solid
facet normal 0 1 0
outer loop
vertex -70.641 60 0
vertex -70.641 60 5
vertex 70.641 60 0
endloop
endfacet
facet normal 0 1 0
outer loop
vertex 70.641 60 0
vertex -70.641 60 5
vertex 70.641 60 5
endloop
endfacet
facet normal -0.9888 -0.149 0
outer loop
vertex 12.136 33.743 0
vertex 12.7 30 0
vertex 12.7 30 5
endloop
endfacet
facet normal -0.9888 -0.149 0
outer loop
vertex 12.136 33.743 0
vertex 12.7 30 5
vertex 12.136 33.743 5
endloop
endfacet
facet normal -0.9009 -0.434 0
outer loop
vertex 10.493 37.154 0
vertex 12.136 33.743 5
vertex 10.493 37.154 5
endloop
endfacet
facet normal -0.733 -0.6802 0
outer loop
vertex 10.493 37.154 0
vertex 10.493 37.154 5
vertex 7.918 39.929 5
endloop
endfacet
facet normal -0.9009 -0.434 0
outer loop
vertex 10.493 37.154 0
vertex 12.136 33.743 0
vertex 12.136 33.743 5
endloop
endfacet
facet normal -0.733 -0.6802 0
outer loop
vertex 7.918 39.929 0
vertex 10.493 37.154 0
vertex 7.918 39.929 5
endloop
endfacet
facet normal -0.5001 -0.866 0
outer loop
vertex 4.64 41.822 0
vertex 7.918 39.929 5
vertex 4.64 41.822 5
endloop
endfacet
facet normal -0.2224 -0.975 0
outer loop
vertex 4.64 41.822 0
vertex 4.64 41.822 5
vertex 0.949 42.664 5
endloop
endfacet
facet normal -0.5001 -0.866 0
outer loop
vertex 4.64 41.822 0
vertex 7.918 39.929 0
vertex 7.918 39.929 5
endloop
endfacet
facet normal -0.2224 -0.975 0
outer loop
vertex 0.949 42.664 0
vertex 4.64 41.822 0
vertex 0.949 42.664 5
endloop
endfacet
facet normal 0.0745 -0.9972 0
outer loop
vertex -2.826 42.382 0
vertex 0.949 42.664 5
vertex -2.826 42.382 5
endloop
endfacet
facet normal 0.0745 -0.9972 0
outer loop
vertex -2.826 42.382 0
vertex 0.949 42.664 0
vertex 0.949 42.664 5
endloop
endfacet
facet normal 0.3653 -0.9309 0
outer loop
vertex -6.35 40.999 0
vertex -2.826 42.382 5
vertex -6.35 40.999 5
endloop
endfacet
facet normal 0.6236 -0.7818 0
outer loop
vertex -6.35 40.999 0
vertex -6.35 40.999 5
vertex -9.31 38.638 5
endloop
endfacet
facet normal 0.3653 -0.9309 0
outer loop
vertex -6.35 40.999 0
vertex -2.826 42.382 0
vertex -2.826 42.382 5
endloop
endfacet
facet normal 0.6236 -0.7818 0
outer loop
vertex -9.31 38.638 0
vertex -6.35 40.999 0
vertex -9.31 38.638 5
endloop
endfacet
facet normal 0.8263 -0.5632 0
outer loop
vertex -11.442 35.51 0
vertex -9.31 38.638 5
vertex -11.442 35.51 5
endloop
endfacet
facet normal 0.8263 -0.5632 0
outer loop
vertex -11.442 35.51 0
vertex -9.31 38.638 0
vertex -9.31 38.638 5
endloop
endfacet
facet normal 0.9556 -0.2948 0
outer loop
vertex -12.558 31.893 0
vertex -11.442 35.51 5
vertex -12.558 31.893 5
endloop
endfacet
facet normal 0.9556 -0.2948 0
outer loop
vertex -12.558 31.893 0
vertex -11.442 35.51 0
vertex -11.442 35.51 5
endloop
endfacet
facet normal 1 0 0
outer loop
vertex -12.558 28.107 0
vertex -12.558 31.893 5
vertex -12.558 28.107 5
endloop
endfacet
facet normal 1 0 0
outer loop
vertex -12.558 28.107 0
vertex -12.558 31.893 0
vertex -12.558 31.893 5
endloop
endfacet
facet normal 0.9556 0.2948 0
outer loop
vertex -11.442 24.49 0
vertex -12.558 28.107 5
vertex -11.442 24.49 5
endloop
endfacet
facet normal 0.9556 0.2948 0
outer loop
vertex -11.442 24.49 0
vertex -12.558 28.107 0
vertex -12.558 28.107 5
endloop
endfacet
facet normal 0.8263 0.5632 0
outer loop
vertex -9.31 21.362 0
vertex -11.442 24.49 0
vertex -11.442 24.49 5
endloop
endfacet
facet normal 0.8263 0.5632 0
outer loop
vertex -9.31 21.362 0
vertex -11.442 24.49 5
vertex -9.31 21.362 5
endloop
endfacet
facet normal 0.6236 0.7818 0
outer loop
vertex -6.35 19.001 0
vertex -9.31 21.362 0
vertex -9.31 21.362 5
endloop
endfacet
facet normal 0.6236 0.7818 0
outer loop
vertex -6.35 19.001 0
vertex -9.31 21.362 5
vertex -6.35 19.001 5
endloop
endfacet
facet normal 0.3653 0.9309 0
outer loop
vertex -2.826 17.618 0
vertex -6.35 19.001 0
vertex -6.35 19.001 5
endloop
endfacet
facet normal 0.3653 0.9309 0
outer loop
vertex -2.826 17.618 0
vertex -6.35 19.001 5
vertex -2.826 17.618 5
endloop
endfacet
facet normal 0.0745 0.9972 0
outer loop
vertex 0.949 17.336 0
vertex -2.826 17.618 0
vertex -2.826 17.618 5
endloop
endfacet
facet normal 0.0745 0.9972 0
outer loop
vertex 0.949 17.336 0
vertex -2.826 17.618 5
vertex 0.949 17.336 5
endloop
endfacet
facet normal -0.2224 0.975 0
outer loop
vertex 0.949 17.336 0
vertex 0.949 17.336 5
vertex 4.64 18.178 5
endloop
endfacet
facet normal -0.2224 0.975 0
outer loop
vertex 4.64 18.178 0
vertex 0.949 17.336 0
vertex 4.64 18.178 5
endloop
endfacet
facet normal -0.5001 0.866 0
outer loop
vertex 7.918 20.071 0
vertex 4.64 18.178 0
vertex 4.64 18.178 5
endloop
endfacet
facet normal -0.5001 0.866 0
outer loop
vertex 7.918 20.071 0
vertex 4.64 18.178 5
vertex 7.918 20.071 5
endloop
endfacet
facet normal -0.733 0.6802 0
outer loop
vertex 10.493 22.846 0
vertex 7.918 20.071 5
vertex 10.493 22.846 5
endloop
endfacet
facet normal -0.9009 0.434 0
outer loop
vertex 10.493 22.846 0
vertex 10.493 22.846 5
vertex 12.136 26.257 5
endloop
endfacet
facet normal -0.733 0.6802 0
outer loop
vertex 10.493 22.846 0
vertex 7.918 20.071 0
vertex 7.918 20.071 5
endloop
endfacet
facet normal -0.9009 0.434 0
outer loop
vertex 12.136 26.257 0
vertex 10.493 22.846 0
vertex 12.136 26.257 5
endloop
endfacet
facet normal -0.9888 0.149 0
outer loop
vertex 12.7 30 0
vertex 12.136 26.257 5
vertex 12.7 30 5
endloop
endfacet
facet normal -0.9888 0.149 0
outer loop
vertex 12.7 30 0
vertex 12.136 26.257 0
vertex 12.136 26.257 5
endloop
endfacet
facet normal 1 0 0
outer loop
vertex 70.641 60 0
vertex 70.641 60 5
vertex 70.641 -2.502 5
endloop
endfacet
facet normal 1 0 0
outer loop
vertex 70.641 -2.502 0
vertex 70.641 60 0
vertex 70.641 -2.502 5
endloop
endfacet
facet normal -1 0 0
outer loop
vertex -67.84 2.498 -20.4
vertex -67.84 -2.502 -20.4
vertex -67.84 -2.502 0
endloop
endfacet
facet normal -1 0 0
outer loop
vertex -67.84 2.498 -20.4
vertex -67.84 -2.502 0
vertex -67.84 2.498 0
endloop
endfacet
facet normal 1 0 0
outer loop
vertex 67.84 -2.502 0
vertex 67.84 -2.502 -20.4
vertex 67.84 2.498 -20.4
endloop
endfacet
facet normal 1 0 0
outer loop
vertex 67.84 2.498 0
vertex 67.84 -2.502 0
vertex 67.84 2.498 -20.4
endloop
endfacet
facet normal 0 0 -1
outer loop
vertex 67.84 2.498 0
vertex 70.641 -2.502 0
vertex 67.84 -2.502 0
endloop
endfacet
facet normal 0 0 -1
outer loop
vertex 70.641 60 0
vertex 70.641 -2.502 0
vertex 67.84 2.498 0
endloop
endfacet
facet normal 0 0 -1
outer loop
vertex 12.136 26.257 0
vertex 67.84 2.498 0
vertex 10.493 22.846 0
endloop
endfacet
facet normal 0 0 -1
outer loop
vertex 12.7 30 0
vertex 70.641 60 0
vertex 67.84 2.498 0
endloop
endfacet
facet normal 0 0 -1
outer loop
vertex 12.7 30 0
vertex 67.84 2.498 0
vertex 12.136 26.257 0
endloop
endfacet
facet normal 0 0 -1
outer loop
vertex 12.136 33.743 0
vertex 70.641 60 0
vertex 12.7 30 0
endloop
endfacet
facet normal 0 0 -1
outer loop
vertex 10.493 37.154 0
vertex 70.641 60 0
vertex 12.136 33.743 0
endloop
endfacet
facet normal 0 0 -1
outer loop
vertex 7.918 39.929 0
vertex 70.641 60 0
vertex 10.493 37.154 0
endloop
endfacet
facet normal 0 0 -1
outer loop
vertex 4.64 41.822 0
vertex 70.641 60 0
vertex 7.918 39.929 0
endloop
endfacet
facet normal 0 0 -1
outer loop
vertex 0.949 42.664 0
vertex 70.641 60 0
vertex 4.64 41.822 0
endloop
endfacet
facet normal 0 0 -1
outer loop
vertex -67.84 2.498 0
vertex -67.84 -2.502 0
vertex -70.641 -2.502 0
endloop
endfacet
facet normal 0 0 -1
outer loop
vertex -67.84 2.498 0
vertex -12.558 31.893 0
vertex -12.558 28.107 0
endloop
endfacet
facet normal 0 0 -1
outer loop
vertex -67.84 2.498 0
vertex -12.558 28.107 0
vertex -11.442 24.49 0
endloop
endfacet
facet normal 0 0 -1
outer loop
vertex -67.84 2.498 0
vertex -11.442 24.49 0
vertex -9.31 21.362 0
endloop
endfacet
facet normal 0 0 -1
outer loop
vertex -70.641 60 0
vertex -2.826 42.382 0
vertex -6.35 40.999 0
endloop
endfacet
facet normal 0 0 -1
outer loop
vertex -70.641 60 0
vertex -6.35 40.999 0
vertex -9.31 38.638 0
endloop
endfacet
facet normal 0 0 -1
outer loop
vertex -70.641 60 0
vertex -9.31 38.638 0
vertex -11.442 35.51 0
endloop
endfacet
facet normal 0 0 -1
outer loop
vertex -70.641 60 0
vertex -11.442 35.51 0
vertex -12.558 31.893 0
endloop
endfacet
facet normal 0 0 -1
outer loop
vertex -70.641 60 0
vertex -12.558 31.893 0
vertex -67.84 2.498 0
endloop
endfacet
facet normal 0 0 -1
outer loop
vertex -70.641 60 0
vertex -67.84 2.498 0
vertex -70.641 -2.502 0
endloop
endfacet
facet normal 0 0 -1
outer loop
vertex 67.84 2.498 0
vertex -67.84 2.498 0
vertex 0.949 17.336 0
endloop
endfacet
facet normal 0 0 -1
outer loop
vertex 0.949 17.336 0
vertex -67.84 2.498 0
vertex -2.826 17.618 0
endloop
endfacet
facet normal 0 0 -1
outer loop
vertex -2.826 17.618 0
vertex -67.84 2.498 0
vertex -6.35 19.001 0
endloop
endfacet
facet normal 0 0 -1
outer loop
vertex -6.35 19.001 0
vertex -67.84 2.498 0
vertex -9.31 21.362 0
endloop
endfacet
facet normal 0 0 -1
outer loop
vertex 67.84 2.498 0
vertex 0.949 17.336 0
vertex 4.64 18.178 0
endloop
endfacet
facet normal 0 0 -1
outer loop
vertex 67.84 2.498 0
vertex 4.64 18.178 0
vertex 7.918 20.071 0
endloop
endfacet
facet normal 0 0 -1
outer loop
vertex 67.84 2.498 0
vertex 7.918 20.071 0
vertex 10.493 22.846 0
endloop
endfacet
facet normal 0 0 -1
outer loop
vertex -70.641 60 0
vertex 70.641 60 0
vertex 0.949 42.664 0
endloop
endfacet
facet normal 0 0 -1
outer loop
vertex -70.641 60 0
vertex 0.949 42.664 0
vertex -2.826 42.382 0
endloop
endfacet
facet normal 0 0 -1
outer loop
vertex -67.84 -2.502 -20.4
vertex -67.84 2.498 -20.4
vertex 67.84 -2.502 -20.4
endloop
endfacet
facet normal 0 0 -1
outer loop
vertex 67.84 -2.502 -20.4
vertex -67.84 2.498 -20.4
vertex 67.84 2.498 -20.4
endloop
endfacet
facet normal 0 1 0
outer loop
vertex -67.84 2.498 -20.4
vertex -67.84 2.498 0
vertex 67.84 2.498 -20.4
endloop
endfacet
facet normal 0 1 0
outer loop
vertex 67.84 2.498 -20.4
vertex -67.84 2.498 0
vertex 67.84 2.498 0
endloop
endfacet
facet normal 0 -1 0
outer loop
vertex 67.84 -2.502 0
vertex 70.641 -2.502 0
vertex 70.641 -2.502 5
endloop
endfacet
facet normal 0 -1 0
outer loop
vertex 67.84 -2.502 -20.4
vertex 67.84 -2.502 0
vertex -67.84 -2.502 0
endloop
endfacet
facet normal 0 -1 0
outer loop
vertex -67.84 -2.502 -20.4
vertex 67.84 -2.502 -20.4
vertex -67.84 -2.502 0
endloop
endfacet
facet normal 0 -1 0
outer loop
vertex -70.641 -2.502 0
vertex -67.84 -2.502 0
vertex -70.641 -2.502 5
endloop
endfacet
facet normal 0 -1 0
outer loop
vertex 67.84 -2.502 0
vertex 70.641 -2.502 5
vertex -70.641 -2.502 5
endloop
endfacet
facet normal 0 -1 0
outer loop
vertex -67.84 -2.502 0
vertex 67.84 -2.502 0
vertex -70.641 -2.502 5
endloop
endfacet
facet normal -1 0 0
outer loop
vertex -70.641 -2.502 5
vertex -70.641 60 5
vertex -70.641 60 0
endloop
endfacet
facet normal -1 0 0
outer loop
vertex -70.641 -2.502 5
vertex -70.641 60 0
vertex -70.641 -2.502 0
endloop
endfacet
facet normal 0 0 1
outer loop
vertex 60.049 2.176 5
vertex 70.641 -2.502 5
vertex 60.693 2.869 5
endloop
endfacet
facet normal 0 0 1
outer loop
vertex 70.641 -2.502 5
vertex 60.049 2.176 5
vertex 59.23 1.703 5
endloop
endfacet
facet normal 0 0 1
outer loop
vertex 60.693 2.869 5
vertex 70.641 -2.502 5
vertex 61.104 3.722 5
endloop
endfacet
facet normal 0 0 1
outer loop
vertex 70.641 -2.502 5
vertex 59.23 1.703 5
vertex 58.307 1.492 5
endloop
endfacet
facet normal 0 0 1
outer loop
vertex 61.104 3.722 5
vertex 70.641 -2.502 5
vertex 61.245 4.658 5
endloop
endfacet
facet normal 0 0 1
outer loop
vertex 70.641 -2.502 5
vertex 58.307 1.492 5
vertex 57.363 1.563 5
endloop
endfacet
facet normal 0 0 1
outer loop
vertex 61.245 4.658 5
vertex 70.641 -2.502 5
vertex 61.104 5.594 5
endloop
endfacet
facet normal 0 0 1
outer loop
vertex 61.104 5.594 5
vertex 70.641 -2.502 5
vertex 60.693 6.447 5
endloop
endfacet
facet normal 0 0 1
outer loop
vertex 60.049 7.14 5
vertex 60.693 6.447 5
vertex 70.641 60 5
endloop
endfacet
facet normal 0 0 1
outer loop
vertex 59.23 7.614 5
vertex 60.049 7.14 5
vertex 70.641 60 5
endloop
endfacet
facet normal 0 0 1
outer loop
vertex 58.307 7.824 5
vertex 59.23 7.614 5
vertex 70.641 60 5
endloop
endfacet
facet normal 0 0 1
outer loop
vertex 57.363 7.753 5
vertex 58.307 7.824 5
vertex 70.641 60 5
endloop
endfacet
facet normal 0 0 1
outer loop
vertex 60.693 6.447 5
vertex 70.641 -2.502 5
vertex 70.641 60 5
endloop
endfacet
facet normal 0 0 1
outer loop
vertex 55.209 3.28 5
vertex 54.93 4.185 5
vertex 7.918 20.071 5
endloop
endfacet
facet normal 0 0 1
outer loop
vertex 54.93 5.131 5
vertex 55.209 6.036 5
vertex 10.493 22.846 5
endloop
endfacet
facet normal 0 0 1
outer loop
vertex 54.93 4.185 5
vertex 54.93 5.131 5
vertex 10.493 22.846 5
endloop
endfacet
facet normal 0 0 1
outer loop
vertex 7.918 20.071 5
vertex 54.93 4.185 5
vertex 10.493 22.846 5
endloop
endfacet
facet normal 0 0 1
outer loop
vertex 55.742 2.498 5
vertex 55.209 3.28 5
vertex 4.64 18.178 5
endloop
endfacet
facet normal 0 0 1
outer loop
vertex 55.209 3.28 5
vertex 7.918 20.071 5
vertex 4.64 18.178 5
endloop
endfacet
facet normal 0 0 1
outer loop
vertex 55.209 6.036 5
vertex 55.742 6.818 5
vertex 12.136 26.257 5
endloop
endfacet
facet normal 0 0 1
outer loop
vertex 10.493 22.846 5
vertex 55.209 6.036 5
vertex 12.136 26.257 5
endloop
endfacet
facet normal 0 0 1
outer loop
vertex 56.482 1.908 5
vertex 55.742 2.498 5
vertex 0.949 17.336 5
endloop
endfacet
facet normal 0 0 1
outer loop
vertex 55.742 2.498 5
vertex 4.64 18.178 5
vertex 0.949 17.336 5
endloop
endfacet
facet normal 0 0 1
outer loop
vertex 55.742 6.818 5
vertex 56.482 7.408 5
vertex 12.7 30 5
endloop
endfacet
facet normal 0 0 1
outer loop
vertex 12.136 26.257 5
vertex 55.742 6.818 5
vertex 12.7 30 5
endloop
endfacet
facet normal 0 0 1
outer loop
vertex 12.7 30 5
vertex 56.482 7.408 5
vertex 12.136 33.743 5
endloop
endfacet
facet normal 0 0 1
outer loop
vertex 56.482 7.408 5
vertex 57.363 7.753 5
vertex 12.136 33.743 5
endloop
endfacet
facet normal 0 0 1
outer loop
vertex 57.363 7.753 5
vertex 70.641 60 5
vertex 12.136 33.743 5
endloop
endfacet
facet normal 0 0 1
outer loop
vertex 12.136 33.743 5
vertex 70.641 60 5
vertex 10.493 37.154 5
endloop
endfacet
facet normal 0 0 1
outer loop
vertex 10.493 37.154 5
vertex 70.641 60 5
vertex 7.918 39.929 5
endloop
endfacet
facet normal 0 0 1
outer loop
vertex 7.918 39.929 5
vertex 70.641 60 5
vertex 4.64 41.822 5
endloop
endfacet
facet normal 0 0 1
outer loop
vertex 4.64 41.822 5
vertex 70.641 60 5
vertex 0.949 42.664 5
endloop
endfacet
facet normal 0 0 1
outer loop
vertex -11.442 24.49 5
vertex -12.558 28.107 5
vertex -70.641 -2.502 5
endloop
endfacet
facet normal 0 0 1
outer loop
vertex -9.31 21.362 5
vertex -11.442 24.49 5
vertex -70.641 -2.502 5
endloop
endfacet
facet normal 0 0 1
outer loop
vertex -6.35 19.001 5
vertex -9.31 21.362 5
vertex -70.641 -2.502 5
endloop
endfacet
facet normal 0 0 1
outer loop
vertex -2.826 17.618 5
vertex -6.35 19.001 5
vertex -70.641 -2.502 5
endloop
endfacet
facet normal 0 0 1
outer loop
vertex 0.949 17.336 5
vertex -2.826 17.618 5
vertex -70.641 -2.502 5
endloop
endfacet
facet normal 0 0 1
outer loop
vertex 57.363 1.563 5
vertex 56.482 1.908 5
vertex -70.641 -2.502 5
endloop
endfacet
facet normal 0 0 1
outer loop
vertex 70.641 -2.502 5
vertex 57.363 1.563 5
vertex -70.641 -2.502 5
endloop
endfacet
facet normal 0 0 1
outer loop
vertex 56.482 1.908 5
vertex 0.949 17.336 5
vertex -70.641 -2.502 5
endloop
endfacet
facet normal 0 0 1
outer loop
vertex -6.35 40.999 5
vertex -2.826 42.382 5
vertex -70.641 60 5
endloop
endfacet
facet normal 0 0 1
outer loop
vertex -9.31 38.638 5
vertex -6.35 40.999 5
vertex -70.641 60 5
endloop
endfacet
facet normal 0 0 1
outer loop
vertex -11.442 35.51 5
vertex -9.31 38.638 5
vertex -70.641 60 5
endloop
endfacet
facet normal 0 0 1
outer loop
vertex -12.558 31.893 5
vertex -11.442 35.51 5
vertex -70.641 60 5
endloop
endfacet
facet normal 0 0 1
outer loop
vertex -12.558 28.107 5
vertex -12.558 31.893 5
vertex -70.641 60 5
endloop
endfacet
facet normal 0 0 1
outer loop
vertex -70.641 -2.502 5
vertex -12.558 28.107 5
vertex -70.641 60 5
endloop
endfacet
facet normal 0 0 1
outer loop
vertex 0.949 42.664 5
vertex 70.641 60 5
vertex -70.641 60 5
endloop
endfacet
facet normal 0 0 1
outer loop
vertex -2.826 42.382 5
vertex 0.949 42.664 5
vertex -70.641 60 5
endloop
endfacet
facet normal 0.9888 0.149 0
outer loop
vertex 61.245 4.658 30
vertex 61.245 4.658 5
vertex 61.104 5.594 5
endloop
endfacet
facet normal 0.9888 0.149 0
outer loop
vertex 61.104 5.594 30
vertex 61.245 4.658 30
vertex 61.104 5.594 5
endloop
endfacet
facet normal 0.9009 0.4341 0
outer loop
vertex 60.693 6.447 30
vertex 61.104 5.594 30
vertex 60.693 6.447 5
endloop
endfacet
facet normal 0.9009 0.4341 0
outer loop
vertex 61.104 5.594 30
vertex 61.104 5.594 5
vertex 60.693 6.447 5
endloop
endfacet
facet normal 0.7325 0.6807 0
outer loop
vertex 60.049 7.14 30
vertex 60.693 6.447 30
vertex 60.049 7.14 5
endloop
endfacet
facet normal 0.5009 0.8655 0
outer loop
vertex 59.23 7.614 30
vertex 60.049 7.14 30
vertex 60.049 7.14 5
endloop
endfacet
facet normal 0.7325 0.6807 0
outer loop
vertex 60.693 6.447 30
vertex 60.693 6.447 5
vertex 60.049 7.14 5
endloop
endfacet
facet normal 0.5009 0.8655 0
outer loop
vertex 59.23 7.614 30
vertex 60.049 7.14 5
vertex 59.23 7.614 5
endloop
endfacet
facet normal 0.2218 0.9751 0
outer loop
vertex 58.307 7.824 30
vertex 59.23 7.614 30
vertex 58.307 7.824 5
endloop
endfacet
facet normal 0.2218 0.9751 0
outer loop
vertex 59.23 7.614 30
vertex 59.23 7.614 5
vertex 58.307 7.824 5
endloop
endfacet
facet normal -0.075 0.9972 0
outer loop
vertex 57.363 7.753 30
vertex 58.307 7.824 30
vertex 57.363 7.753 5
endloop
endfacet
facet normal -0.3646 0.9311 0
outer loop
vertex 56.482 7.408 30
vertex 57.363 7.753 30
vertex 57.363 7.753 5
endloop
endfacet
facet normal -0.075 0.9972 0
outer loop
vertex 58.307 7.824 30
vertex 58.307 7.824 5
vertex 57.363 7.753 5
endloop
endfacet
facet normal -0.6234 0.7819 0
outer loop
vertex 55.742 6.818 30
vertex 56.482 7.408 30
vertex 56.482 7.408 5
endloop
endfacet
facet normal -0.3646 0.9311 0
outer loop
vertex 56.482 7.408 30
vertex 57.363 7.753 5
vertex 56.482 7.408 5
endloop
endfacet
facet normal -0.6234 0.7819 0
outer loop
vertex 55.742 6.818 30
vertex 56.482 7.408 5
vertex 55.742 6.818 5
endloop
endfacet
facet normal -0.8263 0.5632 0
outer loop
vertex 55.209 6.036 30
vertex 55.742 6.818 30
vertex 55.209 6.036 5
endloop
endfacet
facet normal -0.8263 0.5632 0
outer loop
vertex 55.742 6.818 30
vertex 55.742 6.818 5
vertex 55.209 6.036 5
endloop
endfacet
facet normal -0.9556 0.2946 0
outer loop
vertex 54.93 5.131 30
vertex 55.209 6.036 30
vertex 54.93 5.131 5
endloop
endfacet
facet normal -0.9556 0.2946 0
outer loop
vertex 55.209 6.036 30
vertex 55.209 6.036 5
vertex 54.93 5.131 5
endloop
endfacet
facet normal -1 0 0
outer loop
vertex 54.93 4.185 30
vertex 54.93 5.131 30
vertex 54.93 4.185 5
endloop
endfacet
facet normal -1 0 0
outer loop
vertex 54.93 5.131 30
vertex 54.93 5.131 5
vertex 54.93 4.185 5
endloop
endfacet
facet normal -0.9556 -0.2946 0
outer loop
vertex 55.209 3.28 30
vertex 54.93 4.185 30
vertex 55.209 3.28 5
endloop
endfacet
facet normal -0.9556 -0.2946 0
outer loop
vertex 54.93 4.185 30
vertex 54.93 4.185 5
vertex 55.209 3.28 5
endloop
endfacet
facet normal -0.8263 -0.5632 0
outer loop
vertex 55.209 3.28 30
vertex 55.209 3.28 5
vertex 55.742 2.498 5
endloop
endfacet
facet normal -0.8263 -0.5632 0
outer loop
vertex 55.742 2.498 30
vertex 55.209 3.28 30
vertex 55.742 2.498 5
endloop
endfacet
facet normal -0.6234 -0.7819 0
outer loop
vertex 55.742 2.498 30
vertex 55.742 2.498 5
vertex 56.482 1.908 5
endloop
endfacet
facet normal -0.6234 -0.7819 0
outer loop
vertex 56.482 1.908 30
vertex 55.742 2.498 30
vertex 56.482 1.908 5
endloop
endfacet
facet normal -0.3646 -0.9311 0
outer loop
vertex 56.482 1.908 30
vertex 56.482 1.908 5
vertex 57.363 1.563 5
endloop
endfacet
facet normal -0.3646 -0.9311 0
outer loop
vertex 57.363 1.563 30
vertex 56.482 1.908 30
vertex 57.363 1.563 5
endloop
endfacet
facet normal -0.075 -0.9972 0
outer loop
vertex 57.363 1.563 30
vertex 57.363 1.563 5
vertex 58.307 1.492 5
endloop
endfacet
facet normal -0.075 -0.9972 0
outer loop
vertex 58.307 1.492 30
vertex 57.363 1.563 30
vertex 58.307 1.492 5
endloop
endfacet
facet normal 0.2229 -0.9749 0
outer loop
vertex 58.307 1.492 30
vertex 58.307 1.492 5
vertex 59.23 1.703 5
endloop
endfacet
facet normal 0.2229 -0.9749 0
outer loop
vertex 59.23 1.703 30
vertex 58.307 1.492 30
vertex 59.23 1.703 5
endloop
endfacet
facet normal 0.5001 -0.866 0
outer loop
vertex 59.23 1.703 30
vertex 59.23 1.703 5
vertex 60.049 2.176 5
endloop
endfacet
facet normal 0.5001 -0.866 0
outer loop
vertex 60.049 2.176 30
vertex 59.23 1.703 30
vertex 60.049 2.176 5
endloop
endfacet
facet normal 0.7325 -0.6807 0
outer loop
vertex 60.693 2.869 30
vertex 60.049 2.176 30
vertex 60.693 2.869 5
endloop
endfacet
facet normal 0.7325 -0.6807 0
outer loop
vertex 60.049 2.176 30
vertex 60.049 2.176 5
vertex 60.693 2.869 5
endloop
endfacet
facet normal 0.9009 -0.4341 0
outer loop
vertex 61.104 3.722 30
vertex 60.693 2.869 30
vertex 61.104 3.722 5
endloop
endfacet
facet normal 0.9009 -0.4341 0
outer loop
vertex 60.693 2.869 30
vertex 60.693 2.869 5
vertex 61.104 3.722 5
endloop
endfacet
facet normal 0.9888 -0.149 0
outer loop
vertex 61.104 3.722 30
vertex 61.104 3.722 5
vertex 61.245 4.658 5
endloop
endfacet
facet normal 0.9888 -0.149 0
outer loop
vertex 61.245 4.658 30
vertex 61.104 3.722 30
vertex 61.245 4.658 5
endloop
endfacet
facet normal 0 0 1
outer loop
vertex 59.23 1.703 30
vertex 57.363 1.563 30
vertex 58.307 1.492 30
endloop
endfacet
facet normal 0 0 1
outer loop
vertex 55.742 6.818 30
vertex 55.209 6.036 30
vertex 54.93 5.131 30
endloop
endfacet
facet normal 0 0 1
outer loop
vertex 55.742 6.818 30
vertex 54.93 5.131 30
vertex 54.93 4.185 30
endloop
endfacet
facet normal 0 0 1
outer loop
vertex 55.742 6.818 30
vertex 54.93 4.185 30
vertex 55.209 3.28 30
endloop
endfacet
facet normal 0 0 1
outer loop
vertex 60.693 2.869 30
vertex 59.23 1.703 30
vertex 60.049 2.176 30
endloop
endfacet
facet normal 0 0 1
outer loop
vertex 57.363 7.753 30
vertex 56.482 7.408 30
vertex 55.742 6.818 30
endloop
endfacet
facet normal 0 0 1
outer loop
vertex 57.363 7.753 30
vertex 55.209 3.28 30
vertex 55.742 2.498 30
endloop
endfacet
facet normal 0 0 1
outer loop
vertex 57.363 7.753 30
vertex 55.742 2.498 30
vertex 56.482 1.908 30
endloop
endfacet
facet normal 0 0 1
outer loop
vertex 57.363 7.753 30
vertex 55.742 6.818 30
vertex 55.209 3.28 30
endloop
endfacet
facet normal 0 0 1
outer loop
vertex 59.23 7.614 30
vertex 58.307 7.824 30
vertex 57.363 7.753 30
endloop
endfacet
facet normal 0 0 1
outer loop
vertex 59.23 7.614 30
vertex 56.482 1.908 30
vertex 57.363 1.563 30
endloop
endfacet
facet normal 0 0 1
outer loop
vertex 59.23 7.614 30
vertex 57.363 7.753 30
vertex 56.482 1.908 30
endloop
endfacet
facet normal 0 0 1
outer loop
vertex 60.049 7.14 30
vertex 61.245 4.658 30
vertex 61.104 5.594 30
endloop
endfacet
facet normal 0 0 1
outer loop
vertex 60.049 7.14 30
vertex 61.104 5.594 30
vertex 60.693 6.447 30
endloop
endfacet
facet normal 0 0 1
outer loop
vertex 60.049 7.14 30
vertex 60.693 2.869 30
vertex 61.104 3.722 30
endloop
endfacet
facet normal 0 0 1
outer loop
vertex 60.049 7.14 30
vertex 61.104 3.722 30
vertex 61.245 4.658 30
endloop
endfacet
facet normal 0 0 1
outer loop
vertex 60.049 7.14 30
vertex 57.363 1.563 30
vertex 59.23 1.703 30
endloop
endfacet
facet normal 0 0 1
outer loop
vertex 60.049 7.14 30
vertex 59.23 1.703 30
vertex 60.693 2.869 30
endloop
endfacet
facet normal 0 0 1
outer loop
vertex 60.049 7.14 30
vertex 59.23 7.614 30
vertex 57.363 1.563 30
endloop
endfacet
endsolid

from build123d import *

# Parameters (mm, degrees)
CROQUIS1_R              = 12.7
SALIENTE_EXTRUIR1_DEPTH = 5
CROQUIS3_W              = 135.679587796
CROQUIS3_H              = 5
SALIENTE_EXTRUIR3_DEPTH = 25.4
CROQUIS4_R              = 3.175
SALIENTE_EXTRUIR4_DEPTH = 25
SALIENTE_EXTRUIR5_DEPTH = 5


with BuildPart() as part:
    # Croquis1 → Saliente-Extruir1 (new body)
    with BuildSketch(Plane.XY):
        Polygon((67.839793898, 2.498030194), (34.641016151, 60), (-34.641016151, 60), (-67.839793898, 2.498030194), align=None)
        with Locations((0, 30)):
            Circle(CROQUIS1_R, mode=Mode.SUBTRACT)
    extrude(amount=SALIENTE_EXTRUIR1_DEPTH)

    # Croquis3 → Saliente-Extruir3 (add)
    with BuildSketch(Plane.XY.offset(5)):
        with Locations((0, -0.001969806)):
            Rectangle(CROQUIS3_W, CROQUIS3_H)
    extrude(amount=-SALIENTE_EXTRUIR3_DEPTH)

    # Croquis4 → Saliente-Extruir4 (add)
    with BuildSketch(Plane.XY.offset(5)):
        with Locations((58.069793898, 4.658030194)):
            Circle(CROQUIS4_R)
    extrude(amount=SALIENTE_EXTRUIR4_DEPTH)

    # Croquis5 → Saliente-Extruir5 (add)
    with BuildSketch(Plane.XY.offset(5)):
        Polygon((70.641016151, 60), (70.641016151, -2.501969806), (67.839793898, -2.501969806), (67.839793898, 2.498030194), (34.641016151, 60), align=None)
        Polygon((-67.839793898, -2.501969806), (-67.839793898, 2.498030194), (-34.641016151, 60), (-70.641016151, 60), (-70.641016151, -2.501969806), align=None)
    extrude(amount=-SALIENTE_EXTRUIR5_DEPTH)


solid = part.part
